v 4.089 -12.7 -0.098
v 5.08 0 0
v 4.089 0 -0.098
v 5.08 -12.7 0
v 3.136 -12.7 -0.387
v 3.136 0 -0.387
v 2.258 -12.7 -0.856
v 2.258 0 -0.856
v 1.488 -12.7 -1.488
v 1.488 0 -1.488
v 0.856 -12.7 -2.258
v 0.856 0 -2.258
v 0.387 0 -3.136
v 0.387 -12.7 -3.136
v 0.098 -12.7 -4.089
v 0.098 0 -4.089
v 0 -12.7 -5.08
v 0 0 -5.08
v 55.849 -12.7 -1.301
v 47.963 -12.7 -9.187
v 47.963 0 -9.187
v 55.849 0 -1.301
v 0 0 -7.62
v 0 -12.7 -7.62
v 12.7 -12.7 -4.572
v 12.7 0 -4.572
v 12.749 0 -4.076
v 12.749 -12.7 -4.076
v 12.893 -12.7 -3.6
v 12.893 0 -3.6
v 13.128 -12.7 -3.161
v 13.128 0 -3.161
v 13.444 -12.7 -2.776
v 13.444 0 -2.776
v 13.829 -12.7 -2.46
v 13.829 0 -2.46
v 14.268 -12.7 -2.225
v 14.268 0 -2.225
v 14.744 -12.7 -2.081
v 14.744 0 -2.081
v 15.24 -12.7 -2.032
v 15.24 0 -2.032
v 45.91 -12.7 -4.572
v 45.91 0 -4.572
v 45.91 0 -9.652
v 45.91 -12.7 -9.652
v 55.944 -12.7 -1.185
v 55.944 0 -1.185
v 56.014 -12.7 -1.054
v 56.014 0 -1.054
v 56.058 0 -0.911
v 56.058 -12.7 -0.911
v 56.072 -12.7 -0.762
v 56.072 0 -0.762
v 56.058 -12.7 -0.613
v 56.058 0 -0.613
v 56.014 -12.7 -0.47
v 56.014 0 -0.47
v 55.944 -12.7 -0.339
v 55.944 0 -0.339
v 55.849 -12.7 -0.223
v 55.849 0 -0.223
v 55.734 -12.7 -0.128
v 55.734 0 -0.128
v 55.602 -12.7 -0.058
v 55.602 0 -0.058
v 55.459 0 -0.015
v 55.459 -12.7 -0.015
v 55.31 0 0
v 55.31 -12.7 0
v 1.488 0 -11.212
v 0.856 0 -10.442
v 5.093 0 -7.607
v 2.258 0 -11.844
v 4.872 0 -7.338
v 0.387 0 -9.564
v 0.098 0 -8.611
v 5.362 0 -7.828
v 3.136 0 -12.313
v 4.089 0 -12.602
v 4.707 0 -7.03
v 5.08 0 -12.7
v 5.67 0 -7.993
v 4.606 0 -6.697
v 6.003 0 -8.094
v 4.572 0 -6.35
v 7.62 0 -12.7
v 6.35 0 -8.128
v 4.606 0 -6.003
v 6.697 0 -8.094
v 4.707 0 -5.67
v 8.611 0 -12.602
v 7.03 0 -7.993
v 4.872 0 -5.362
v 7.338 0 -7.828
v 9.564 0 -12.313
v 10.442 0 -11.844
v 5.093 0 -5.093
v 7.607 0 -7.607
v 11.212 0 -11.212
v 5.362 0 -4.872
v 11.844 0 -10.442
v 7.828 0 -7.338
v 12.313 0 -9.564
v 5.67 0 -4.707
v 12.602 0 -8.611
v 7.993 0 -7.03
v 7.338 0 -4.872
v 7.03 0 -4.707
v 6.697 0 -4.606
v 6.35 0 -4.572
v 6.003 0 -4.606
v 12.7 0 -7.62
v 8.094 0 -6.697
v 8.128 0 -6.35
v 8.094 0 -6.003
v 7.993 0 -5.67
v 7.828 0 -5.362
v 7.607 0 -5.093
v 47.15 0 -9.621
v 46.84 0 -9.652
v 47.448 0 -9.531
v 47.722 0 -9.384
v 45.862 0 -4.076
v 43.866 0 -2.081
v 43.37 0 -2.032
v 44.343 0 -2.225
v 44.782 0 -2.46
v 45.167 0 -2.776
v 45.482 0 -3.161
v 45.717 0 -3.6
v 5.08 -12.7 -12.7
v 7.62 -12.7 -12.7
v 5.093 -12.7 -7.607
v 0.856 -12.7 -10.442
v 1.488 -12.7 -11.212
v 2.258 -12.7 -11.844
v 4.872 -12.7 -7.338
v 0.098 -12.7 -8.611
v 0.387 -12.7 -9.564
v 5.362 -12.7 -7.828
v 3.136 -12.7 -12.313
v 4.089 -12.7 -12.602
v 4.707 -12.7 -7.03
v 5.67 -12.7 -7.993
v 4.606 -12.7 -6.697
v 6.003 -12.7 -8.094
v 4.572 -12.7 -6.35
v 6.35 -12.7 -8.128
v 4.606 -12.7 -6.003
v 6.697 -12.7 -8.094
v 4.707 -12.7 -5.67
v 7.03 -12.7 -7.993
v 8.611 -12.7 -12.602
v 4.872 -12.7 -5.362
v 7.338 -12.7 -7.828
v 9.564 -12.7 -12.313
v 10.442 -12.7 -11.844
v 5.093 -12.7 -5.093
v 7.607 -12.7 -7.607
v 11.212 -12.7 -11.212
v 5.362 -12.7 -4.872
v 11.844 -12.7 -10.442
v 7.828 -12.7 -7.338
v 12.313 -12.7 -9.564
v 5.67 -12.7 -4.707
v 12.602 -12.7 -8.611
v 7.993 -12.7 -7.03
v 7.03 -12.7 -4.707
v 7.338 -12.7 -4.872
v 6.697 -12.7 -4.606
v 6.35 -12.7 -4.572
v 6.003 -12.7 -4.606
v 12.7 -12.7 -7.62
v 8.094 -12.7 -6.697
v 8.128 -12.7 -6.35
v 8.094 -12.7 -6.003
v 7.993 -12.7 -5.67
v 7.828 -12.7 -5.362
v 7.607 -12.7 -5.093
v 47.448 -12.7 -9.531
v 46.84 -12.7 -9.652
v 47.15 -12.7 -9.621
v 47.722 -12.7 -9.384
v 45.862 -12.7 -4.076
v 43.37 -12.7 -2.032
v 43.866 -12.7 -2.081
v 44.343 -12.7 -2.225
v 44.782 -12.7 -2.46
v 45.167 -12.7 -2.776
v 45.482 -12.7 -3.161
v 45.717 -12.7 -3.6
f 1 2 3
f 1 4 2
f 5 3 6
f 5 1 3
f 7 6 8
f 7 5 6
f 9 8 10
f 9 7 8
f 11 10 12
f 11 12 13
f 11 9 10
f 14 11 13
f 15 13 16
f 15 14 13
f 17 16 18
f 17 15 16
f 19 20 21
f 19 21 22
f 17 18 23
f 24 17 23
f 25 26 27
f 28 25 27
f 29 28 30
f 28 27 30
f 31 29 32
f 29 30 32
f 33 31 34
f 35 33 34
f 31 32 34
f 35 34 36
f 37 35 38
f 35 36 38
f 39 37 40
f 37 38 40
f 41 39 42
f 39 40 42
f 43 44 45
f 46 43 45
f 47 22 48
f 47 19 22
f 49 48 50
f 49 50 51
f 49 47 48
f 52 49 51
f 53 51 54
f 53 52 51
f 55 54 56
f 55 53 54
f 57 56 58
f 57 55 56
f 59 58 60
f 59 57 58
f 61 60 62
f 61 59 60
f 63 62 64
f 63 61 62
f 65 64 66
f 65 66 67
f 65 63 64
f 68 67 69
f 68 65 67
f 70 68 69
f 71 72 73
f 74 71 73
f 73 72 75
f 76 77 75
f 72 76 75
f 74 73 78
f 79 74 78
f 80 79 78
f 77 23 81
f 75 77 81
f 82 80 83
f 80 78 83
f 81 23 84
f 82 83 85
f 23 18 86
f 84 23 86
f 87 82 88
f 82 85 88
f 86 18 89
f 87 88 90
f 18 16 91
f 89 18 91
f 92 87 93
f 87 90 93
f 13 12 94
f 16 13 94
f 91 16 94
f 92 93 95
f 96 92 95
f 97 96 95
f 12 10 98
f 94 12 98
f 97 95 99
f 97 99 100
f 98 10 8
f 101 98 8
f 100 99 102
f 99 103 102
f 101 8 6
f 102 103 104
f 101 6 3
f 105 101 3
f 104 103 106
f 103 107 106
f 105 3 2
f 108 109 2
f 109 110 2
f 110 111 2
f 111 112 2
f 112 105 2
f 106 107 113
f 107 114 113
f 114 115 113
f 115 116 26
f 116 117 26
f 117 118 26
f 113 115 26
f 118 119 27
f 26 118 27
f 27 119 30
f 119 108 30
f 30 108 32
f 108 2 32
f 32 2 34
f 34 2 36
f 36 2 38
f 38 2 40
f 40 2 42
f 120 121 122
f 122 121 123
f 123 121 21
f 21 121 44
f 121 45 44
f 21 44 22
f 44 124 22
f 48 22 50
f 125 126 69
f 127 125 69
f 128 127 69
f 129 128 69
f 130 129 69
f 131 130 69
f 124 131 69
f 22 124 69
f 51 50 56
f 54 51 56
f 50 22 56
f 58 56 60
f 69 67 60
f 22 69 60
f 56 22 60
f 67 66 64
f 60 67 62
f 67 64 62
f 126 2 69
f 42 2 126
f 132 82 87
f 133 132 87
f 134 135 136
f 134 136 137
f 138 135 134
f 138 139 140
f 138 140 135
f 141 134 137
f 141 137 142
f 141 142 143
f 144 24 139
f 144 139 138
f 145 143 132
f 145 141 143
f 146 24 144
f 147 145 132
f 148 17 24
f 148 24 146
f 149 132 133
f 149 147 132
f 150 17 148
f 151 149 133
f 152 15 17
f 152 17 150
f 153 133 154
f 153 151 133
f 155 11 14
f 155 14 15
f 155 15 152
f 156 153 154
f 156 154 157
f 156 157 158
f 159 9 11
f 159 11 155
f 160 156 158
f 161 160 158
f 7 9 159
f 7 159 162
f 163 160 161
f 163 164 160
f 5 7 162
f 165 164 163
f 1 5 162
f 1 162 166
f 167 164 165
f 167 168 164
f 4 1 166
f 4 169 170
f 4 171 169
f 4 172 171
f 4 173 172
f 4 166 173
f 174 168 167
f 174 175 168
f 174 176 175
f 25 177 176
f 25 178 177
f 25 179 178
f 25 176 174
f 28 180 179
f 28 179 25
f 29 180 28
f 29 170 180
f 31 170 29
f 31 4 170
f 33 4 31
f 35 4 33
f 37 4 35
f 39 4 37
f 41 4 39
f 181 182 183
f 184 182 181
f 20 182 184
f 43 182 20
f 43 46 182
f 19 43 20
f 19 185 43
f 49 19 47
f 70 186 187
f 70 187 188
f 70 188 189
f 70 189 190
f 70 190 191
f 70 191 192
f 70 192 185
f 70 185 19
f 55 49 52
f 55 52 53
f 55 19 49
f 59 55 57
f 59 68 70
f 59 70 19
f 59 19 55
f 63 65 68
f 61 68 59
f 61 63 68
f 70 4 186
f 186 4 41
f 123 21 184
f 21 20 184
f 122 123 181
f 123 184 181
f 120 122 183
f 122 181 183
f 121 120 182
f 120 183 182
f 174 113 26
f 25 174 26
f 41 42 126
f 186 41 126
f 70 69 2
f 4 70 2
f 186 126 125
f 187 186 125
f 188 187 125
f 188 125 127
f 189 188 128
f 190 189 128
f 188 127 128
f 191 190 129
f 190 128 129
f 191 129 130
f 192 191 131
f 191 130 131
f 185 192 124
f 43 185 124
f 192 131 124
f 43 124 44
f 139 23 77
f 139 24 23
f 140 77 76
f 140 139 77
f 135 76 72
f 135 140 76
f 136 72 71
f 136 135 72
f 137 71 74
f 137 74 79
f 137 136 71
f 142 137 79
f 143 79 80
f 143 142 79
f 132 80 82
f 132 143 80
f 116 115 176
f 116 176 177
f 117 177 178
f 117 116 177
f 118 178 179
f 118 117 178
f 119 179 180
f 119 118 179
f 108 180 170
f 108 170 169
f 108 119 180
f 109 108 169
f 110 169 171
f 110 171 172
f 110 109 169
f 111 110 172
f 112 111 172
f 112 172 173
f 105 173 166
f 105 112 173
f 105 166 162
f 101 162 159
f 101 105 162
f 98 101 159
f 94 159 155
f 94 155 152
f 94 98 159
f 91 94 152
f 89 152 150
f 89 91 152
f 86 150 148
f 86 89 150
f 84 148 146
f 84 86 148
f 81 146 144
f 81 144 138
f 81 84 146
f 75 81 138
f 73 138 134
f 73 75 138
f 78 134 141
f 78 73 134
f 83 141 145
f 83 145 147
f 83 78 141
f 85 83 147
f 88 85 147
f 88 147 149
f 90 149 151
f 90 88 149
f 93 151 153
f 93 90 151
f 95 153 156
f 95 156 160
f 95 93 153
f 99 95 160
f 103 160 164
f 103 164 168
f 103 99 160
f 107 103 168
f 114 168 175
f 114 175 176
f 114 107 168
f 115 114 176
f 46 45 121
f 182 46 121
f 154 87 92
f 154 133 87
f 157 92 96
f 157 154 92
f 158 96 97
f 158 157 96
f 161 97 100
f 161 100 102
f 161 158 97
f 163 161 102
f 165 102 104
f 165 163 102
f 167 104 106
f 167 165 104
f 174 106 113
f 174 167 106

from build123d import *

# Parameters (mm, degrees)
F0_R     = 1.778
F1_DEPTH = 12.7
F2_R     = 1.5875
F3_R     = 0.762
F4_R     = 5.08


with BuildPart() as f1:
    # F0 (on Front) → F1 (new body)
    with BuildSketch(Plane.XZ):
        with BuildLine():
            Line((57.15, 0), (0, 0))
            Line((0, 0), (0, -12.7))
            Line((0, -12.7), (12.7, -12.7))
            Line((12.7, -12.7), (12.7, -4.572))
            ThreePointArc((12.7, -4.572), (13.443949, -2.775949), (15.24, -2.032))
            Line((15.24, -2.032), (43.3705, -2.032))
            ThreePointArc((43.3705, -2.032), (45.166551, -2.775949), (45.9105, -4.572))
            Line((45.9105, -4.572), (45.9105, -9.652))
            Line((45.9105, -9.652), (47.498, -9.652))
            Line((47.498, -9.652), (57.15, 0))
        make_face()
        with Locations((6.35, -6.35)):
            Circle(F0_R, mode=Mode.SUBTRACT)
    extrude(amount=F1_DEPTH)

    # F2
    f2_edges = [f1.edges().sort_by_distance(p)[0] for p in [
        (47.498, -6.35, -9.652),
    ]]
    fillet(f2_edges, radius=F2_R)

    # F3
    f3_edges = [f1.edges().sort_by_distance(p)[0] for p in [
        (57.15, -6.35, 0),
    ]]
    fillet(f3_edges, radius=F3_R)

    # F4
    f4_edges = [f1.edges().sort_by_distance(p)[0] for p in [
        (0, -6.35, -12.7),
        (12.7, -6.35, -12.7),
        (0, -6.35, 0),
    ]]
    fillet(f4_edges, radius=F4_R)


solid = f1.part
